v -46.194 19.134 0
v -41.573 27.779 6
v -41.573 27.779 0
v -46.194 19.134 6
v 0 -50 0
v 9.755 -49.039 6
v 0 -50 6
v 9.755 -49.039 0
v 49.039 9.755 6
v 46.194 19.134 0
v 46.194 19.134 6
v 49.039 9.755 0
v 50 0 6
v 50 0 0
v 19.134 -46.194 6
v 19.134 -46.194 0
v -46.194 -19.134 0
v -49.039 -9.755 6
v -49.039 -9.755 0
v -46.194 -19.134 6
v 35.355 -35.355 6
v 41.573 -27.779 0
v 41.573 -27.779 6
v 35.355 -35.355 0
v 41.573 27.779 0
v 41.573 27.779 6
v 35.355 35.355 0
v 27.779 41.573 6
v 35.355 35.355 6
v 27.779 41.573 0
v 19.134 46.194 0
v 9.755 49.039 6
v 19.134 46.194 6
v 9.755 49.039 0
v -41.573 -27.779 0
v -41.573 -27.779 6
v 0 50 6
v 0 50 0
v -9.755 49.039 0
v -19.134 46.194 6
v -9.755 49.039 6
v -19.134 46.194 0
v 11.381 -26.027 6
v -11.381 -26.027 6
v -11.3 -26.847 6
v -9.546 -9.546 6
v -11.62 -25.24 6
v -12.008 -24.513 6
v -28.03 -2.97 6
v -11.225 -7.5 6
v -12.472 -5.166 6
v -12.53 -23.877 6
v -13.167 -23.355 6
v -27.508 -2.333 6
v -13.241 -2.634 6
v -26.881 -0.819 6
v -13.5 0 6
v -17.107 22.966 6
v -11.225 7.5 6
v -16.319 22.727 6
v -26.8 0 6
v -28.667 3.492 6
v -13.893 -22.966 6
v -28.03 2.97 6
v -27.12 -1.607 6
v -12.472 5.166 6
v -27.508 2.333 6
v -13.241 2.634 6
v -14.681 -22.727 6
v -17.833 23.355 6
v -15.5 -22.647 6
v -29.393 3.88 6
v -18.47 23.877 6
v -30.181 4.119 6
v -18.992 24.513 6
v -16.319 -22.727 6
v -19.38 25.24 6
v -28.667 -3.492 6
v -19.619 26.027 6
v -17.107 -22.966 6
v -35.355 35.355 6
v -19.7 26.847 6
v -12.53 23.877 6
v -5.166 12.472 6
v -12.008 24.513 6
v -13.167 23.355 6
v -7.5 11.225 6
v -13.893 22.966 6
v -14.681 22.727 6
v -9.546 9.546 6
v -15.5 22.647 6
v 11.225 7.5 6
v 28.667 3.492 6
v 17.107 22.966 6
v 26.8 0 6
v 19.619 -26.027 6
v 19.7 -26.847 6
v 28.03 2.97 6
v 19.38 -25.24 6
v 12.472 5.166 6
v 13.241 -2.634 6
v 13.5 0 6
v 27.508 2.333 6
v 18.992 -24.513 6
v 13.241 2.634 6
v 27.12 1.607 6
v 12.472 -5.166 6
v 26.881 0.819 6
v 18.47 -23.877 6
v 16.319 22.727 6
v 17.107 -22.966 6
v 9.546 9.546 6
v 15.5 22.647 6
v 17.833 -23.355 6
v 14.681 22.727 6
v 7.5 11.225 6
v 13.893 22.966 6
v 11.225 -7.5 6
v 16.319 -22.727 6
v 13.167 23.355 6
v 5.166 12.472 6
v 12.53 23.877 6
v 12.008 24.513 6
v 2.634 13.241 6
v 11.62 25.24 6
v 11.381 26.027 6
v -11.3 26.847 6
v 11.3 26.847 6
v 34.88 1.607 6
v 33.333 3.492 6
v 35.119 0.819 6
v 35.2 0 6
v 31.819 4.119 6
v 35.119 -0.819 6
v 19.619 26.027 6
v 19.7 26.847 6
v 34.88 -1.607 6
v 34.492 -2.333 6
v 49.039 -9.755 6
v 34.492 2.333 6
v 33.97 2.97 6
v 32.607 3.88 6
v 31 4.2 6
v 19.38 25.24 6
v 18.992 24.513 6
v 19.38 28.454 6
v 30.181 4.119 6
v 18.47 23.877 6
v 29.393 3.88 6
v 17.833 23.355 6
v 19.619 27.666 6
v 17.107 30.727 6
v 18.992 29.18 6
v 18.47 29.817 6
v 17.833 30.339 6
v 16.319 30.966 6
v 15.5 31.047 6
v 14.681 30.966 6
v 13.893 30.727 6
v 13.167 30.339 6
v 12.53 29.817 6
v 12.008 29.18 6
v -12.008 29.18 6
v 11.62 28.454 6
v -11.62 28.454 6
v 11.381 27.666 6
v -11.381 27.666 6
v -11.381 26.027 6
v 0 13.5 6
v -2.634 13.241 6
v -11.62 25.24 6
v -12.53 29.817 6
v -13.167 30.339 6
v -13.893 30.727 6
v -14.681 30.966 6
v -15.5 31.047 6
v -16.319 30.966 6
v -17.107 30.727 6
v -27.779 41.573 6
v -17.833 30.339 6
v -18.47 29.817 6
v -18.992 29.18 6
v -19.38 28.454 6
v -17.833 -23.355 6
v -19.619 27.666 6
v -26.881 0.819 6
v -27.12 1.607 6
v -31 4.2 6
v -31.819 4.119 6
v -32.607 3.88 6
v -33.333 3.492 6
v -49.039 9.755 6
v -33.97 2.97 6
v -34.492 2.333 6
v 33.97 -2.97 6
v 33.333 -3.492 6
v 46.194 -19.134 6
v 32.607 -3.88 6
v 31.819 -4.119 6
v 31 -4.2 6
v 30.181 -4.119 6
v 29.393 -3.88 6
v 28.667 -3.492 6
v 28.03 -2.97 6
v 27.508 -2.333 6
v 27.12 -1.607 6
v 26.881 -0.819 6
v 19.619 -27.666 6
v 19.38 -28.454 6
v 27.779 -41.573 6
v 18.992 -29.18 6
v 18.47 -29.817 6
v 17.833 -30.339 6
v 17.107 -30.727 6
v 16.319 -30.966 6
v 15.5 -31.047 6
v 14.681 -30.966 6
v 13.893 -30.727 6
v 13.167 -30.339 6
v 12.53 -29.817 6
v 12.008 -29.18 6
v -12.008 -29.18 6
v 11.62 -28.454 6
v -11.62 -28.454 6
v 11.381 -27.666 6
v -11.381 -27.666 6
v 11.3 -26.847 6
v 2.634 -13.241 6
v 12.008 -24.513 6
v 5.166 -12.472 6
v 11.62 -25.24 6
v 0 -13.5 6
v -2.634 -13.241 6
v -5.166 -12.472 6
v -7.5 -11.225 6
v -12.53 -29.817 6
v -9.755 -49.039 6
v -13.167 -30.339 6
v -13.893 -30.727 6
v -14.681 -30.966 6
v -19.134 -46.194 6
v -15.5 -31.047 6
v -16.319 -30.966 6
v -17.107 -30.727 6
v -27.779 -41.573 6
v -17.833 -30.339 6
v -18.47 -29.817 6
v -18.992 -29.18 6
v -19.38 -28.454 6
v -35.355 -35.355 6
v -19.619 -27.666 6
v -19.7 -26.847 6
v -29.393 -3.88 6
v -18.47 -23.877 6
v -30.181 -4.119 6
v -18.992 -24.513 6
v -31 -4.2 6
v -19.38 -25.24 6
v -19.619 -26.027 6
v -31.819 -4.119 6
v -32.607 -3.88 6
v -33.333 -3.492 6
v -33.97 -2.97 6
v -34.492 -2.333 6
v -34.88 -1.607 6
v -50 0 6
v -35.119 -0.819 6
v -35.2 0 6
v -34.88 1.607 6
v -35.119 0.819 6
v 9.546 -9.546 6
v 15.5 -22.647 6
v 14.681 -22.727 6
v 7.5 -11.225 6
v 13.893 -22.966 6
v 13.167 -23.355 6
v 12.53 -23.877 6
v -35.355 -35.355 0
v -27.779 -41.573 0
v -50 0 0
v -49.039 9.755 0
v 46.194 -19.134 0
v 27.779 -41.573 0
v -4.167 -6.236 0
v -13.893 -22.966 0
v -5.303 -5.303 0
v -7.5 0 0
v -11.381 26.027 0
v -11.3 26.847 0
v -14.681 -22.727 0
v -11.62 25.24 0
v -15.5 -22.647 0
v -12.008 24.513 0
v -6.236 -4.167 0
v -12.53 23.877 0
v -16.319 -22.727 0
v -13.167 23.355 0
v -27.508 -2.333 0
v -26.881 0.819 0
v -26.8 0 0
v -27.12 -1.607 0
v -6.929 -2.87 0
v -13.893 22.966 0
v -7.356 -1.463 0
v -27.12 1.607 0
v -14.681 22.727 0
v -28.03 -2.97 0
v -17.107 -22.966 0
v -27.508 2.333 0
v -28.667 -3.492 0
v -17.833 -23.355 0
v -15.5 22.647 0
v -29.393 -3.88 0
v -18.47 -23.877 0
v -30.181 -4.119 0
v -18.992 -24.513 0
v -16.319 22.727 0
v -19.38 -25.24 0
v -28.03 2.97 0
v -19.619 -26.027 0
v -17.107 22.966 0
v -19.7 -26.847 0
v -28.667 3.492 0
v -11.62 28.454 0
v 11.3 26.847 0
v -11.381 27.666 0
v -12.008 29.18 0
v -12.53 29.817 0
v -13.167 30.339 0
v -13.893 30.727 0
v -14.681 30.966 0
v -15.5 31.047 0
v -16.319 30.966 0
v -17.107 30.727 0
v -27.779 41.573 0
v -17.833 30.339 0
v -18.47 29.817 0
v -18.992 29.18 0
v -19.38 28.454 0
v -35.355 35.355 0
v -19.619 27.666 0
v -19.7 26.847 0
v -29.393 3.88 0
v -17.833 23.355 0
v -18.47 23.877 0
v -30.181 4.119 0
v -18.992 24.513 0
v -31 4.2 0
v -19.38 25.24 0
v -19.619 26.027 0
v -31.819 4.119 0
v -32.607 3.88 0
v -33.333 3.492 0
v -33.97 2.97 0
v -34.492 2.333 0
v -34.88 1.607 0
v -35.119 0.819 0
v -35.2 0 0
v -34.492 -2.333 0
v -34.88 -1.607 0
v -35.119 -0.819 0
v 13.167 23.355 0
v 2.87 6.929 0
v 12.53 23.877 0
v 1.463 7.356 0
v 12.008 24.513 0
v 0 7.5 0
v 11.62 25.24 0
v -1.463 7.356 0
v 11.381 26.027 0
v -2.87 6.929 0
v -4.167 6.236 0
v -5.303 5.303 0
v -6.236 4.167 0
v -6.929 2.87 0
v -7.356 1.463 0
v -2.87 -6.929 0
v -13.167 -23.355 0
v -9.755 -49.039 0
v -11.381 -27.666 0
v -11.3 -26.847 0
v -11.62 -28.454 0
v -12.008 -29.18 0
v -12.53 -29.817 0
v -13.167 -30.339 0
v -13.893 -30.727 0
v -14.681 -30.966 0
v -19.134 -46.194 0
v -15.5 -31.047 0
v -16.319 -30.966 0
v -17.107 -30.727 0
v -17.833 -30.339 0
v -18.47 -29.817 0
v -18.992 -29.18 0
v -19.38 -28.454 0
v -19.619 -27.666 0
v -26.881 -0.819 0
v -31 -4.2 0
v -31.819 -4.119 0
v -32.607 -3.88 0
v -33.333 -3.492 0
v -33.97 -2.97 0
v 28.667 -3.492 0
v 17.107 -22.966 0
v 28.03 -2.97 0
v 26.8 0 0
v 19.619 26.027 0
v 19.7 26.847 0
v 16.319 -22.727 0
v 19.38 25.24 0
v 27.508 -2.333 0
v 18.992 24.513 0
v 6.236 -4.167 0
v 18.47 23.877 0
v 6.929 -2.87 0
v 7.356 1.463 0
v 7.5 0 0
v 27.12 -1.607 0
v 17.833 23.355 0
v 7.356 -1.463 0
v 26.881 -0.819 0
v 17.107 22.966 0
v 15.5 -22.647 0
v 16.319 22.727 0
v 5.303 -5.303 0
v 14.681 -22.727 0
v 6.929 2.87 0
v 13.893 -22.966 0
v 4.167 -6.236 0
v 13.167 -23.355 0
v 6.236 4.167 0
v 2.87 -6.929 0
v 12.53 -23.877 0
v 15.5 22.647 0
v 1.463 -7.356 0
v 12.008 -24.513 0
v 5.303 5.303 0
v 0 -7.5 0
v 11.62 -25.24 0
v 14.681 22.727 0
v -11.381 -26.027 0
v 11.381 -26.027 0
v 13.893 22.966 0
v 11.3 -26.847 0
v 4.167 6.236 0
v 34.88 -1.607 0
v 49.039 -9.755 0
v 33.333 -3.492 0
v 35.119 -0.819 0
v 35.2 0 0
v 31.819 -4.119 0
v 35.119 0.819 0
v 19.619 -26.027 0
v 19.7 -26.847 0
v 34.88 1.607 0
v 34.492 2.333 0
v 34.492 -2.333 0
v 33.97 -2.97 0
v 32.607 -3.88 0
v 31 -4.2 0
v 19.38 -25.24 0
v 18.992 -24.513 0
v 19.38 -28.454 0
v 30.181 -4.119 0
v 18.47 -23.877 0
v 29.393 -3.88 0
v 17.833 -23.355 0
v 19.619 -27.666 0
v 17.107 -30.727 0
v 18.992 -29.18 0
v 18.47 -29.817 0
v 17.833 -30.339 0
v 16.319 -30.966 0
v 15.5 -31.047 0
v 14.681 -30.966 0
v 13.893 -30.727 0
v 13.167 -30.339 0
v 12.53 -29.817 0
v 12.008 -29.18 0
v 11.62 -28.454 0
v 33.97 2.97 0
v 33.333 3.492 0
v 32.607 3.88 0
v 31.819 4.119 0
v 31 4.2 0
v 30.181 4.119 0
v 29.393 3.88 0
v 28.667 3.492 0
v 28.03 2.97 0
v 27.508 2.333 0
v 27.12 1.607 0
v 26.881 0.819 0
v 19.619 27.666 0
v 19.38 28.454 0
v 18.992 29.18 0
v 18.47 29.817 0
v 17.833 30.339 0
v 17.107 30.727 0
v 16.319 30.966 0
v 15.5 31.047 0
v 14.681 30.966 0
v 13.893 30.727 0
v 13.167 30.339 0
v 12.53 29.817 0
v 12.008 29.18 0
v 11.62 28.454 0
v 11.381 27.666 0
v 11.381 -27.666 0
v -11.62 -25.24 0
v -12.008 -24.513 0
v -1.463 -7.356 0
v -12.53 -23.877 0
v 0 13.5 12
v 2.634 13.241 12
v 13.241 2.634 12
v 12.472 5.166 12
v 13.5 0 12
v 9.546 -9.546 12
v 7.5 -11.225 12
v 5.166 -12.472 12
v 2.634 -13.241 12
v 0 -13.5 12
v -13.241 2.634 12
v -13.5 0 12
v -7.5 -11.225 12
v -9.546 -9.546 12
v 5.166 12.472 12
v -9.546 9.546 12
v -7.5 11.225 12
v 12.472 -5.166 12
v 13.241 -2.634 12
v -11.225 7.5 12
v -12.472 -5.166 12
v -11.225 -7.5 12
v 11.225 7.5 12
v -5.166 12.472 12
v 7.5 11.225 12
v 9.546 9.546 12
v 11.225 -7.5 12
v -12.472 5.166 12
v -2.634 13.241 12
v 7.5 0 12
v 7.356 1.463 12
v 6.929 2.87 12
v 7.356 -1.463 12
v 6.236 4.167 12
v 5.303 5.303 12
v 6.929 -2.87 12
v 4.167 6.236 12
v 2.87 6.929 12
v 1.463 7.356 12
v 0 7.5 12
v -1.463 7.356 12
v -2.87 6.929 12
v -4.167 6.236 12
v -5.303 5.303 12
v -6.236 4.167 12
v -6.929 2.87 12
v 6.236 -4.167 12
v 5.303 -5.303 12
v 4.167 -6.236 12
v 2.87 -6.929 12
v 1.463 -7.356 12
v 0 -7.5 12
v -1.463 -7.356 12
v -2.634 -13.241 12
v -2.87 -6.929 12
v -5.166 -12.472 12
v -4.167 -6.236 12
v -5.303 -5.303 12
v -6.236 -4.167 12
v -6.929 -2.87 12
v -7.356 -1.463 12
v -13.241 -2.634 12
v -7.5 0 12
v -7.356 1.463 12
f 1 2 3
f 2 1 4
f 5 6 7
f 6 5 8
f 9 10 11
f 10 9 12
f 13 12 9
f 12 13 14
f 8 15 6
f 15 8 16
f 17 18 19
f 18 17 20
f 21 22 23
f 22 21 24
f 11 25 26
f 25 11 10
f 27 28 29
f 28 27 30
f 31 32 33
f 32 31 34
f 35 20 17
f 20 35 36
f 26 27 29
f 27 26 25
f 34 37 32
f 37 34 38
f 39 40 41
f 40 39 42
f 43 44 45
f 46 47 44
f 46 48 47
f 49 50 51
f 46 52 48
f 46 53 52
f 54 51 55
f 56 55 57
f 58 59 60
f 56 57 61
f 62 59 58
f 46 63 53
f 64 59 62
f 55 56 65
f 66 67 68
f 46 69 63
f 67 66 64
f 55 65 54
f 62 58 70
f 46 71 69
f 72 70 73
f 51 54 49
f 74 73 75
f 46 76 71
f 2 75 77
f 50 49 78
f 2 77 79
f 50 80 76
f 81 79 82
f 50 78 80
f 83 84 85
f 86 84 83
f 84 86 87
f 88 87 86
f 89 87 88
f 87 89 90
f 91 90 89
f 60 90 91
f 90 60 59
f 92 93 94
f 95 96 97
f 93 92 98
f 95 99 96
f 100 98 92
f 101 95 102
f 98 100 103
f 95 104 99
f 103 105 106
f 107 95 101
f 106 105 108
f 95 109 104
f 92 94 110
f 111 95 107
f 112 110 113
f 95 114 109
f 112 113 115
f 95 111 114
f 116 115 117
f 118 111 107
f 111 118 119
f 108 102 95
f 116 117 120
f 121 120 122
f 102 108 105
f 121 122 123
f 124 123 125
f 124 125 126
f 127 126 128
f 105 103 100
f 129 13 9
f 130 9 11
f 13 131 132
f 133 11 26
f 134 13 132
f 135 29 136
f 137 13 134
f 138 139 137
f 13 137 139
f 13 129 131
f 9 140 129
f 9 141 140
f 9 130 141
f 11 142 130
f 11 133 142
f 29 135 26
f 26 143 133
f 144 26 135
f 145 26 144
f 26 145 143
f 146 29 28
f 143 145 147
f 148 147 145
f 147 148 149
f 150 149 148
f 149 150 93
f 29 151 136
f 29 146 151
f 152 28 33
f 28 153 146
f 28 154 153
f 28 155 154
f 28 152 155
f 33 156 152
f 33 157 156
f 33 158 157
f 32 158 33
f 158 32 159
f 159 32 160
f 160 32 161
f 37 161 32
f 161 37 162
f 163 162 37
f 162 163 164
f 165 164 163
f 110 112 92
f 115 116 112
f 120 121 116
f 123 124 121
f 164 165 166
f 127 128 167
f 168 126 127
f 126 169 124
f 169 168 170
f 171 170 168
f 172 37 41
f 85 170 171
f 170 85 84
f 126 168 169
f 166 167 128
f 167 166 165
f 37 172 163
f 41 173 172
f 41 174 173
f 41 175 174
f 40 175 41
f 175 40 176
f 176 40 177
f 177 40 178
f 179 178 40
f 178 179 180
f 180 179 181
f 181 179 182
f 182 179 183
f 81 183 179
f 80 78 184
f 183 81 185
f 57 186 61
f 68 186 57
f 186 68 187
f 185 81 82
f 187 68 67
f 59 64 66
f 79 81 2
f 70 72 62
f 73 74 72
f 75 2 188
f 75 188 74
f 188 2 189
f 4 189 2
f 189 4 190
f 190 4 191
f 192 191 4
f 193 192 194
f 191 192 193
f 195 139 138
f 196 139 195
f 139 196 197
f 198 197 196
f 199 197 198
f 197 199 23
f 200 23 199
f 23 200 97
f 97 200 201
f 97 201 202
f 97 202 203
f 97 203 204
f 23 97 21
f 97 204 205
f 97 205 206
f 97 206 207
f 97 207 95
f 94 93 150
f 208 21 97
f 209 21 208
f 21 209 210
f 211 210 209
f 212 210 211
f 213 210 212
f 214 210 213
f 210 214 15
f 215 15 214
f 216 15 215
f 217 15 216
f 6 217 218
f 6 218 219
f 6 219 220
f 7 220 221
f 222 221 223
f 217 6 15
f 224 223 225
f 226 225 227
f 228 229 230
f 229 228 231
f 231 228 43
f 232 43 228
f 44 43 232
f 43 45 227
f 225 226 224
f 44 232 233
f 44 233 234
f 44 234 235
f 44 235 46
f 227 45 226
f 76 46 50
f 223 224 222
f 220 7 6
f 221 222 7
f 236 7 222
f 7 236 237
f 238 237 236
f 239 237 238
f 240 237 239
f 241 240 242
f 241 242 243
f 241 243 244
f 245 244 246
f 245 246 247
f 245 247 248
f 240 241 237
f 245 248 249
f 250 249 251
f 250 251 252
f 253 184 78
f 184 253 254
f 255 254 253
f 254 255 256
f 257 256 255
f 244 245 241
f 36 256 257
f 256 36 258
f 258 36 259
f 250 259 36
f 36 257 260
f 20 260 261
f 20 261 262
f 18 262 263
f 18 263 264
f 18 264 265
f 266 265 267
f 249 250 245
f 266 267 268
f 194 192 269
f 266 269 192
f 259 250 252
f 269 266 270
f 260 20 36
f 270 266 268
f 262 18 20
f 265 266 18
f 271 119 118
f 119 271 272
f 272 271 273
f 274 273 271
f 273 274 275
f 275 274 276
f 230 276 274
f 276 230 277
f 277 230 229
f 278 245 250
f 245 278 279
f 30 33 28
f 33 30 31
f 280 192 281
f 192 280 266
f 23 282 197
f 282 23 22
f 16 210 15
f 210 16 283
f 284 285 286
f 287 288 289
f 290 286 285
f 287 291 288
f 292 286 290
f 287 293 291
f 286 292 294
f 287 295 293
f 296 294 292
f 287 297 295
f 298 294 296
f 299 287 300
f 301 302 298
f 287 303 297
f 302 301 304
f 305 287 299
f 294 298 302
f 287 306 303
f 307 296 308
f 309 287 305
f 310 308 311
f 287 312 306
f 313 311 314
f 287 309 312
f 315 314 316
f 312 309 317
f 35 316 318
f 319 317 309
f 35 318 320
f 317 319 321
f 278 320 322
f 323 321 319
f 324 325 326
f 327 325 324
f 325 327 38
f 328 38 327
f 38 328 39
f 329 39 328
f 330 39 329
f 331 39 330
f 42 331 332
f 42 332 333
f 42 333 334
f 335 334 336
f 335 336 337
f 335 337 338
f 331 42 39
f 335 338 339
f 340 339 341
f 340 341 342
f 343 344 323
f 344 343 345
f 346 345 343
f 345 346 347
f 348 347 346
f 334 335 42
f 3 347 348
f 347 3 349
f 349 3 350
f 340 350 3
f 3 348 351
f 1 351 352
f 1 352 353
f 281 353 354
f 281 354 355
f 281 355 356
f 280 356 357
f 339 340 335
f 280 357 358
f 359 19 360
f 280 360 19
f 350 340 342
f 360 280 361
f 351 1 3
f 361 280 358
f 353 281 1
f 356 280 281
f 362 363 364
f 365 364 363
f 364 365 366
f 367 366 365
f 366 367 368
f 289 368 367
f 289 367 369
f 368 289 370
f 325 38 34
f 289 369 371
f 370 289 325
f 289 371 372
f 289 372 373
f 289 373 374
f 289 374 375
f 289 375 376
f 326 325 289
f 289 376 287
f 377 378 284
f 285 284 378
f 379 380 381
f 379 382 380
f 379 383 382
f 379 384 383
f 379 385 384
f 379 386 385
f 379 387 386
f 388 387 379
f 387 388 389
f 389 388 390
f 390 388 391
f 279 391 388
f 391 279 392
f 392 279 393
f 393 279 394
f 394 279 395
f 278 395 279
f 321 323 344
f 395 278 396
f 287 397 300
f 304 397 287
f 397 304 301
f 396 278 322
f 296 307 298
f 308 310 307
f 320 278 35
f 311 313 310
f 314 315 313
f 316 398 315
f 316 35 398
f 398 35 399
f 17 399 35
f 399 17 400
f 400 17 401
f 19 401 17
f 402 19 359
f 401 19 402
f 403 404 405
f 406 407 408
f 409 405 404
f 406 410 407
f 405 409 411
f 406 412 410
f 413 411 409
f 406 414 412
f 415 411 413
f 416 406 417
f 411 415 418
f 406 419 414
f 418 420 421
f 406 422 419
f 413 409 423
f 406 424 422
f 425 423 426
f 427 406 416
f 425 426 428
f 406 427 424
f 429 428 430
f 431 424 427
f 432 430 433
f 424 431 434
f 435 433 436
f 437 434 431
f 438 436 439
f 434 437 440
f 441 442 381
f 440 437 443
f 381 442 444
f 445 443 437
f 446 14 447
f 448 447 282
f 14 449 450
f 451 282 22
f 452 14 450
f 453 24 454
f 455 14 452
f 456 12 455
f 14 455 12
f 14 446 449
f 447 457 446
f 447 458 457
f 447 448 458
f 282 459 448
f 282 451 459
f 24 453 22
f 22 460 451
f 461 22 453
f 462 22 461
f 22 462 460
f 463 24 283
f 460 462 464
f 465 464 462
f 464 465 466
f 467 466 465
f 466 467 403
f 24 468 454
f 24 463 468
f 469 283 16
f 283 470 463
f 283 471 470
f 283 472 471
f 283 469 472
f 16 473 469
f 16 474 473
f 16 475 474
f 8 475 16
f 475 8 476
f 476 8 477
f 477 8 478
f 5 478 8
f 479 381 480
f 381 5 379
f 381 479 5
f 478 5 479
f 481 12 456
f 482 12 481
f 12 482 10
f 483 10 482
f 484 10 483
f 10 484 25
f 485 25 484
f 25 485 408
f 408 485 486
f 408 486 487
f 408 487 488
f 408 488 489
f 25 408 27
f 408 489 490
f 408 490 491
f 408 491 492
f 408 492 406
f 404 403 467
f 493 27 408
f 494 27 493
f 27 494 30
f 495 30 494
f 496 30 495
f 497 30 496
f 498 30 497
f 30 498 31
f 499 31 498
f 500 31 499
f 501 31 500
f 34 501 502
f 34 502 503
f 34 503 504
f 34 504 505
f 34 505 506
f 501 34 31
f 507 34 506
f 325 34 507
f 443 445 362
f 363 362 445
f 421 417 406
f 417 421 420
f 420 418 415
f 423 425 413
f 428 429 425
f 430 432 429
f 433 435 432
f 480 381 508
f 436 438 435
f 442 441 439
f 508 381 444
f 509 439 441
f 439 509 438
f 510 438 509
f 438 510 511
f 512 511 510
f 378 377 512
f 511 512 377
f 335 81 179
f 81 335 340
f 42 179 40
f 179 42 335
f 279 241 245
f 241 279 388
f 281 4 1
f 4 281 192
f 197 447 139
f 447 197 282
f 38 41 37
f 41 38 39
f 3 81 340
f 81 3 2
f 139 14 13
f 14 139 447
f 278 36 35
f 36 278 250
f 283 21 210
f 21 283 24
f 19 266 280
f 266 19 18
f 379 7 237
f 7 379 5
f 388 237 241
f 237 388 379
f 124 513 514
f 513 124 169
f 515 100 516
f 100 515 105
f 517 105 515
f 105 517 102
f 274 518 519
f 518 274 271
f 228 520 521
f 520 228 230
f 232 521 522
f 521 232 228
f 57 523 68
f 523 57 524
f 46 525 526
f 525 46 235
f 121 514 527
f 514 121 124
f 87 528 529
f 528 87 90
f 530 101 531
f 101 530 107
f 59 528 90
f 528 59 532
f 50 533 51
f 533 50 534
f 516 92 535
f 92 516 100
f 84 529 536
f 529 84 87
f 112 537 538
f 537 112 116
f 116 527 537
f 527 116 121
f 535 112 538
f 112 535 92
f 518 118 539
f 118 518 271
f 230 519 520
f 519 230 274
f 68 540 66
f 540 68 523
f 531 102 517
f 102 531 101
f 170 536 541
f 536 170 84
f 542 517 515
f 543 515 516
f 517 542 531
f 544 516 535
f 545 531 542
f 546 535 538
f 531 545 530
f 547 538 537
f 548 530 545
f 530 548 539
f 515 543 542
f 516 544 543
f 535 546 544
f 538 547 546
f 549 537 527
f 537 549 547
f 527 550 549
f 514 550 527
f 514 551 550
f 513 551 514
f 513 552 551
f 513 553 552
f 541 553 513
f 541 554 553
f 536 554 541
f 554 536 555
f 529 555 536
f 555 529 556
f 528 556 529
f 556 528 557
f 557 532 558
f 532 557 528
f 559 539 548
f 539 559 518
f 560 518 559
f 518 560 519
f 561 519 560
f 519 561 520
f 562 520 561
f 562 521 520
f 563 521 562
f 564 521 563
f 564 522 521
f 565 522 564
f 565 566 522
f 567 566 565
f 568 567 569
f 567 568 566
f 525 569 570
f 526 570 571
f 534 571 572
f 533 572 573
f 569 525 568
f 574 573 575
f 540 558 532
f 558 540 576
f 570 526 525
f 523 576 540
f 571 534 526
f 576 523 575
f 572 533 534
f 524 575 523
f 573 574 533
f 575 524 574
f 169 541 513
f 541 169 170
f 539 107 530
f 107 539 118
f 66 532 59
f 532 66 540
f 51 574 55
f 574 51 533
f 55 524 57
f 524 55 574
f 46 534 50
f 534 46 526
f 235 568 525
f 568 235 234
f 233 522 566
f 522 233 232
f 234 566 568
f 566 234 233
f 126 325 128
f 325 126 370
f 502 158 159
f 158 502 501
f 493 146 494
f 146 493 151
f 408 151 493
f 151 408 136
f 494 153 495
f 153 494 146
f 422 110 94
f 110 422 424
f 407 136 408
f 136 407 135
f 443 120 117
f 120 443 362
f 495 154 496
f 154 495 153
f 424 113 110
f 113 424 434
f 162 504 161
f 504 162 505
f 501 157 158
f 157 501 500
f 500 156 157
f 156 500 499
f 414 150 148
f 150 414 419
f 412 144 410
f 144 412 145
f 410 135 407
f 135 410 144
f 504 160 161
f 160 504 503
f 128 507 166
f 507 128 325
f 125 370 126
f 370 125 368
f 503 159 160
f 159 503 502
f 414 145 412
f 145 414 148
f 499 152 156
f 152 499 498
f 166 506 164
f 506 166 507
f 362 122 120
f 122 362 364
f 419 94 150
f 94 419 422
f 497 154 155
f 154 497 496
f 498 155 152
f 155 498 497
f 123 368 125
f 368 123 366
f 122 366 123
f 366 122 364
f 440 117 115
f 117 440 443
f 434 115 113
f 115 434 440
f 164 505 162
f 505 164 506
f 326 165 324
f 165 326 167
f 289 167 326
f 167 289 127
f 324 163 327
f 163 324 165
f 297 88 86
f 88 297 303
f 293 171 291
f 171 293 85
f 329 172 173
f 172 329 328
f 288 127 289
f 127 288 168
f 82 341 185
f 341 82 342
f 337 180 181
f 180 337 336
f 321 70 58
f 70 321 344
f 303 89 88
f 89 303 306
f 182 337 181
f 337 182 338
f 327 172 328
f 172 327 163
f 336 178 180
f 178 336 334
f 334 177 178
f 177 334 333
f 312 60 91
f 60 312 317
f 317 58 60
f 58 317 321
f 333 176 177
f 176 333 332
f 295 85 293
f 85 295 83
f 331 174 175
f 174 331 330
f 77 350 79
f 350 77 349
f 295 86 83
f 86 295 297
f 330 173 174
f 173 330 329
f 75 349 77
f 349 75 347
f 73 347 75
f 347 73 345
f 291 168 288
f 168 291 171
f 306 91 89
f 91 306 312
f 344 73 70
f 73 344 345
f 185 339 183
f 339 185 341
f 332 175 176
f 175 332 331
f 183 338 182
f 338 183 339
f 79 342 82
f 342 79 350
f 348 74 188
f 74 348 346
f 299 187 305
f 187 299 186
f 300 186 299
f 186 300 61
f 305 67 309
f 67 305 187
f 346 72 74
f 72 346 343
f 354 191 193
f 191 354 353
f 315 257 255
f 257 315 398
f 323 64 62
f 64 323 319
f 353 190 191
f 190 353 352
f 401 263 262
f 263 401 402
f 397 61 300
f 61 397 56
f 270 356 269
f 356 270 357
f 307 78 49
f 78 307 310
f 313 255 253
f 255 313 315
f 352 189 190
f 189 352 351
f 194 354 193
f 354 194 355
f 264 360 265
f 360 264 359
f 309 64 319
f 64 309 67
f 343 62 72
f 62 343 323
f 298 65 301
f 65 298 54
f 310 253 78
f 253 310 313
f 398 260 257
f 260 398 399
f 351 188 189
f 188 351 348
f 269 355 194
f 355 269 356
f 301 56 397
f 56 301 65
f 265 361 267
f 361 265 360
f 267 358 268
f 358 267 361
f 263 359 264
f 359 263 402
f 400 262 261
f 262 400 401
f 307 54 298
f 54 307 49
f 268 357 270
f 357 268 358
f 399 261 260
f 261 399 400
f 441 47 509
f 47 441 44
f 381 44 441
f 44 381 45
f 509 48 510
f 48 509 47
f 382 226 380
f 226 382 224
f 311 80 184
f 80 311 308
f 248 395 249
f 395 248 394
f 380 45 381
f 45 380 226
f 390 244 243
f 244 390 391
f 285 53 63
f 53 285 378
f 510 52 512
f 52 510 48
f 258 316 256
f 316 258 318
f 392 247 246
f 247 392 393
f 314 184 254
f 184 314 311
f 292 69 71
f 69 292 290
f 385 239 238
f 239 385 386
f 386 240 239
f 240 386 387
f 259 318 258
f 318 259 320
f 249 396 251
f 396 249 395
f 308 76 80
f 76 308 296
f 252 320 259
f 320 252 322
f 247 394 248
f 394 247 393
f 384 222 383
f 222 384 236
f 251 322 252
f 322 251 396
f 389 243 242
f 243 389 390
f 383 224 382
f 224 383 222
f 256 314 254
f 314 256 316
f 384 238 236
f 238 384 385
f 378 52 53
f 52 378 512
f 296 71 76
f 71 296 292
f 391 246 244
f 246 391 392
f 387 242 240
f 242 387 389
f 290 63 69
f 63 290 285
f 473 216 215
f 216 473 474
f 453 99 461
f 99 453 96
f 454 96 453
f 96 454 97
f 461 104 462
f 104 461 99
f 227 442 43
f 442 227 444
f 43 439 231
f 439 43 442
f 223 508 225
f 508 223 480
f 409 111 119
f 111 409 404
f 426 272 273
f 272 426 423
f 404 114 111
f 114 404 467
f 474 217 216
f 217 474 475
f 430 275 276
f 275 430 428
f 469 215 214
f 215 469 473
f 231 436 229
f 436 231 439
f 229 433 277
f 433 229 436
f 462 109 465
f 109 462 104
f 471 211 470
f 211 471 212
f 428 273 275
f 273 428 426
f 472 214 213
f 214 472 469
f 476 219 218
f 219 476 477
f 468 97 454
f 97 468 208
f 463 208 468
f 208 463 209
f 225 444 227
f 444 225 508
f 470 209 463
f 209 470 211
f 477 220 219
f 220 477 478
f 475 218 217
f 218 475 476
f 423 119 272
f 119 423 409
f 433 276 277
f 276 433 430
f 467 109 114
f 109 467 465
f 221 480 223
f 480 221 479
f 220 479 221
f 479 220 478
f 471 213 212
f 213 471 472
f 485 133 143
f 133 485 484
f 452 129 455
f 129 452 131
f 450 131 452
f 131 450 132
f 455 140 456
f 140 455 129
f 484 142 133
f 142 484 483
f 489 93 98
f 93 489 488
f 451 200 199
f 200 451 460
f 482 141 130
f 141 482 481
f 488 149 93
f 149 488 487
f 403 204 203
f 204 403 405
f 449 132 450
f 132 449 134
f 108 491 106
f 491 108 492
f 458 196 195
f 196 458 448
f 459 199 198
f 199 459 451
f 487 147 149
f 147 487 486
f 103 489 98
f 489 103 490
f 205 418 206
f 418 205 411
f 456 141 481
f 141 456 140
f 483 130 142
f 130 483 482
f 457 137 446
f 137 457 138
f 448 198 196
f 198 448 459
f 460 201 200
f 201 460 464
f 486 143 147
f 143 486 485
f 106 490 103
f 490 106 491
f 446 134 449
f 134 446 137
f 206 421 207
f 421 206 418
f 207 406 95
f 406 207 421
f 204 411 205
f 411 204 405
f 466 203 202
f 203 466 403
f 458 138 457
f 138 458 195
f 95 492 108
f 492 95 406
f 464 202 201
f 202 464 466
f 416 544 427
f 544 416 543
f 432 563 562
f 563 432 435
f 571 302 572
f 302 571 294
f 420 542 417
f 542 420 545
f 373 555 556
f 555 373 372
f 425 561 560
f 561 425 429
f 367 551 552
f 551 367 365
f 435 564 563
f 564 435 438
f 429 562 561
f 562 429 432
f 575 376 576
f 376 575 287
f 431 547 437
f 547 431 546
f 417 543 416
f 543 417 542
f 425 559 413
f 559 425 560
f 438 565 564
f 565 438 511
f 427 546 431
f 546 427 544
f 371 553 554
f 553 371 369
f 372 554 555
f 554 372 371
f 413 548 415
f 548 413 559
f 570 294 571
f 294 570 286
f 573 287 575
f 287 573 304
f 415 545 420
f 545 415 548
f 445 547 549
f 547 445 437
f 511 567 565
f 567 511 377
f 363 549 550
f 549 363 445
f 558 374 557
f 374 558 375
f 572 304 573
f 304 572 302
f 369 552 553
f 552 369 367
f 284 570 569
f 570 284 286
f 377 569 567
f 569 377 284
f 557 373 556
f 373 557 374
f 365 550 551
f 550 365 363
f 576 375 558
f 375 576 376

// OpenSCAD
$fn = 32;

// ----------------------------------------------------------------------
// Flange Ø100 x 6
// 6 holes on a Ø62 bolt circle, bolted joints
// ----------------------------------------------------------------------

// --- parameters (mm) ---
flange_d = 100;  // outside diameter of the flange
thickness = 6;   // flange thickness
holes = 6;       // number of bolt holes
pcd = 62;        // bolt circle diameter
start_deg = 60;  // angle of the first hole, from +X
hole_d = 8.4;    // bolt hole diameter
bore_d = 15;     // central through bore
hub_d = 27;      // hub outside diameter
hub_h = 6;       // hub height above the flange face (0 = no hub)

// --- derived feature positions (mm) ---
height = thickness + hub_h;  // = 12   overall height of the part
pcd_r = pcd / 2;             // = 31   bolt circle radius
hole_step = 360 / holes;     // = 60   angular pitch
feature_centers = [
  [pcd_r * cos(start_deg + 0 * hole_step), pcd_r * sin(start_deg + 0 * hole_step)],
  [pcd_r * cos(start_deg + 1 * hole_step), pcd_r * sin(start_deg + 1 * hole_step)],
  [pcd_r * cos(start_deg + 2 * hole_step), pcd_r * sin(start_deg + 2 * hole_step)],
  [pcd_r * cos(start_deg + 3 * hole_step), pcd_r * sin(start_deg + 3 * hole_step)],
  [pcd_r * cos(start_deg + 4 * hole_step), pcd_r * sin(start_deg + 4 * hole_step)],
  [pcd_r * cos(start_deg + 5 * hole_step), pcd_r * sin(start_deg + 5 * hole_step)]
];   // bolt hole centres on the pitch circle

// flange disc, every hole and the bore cut straight through
difference() {
  union() {
    cylinder(d = flange_d, h = thickness);
    cylinder(d = hub_d, h = height);  // hub, overlapped into the flange
  }
  translate([0, 0, -1]) cylinder(d = bore_d, h = height + 2);  // bore, through
  for (centre = feature_centers)
    translate([centre[0], centre[1], -1]) cylinder(d = hole_d, h = thickness + 2);
}
